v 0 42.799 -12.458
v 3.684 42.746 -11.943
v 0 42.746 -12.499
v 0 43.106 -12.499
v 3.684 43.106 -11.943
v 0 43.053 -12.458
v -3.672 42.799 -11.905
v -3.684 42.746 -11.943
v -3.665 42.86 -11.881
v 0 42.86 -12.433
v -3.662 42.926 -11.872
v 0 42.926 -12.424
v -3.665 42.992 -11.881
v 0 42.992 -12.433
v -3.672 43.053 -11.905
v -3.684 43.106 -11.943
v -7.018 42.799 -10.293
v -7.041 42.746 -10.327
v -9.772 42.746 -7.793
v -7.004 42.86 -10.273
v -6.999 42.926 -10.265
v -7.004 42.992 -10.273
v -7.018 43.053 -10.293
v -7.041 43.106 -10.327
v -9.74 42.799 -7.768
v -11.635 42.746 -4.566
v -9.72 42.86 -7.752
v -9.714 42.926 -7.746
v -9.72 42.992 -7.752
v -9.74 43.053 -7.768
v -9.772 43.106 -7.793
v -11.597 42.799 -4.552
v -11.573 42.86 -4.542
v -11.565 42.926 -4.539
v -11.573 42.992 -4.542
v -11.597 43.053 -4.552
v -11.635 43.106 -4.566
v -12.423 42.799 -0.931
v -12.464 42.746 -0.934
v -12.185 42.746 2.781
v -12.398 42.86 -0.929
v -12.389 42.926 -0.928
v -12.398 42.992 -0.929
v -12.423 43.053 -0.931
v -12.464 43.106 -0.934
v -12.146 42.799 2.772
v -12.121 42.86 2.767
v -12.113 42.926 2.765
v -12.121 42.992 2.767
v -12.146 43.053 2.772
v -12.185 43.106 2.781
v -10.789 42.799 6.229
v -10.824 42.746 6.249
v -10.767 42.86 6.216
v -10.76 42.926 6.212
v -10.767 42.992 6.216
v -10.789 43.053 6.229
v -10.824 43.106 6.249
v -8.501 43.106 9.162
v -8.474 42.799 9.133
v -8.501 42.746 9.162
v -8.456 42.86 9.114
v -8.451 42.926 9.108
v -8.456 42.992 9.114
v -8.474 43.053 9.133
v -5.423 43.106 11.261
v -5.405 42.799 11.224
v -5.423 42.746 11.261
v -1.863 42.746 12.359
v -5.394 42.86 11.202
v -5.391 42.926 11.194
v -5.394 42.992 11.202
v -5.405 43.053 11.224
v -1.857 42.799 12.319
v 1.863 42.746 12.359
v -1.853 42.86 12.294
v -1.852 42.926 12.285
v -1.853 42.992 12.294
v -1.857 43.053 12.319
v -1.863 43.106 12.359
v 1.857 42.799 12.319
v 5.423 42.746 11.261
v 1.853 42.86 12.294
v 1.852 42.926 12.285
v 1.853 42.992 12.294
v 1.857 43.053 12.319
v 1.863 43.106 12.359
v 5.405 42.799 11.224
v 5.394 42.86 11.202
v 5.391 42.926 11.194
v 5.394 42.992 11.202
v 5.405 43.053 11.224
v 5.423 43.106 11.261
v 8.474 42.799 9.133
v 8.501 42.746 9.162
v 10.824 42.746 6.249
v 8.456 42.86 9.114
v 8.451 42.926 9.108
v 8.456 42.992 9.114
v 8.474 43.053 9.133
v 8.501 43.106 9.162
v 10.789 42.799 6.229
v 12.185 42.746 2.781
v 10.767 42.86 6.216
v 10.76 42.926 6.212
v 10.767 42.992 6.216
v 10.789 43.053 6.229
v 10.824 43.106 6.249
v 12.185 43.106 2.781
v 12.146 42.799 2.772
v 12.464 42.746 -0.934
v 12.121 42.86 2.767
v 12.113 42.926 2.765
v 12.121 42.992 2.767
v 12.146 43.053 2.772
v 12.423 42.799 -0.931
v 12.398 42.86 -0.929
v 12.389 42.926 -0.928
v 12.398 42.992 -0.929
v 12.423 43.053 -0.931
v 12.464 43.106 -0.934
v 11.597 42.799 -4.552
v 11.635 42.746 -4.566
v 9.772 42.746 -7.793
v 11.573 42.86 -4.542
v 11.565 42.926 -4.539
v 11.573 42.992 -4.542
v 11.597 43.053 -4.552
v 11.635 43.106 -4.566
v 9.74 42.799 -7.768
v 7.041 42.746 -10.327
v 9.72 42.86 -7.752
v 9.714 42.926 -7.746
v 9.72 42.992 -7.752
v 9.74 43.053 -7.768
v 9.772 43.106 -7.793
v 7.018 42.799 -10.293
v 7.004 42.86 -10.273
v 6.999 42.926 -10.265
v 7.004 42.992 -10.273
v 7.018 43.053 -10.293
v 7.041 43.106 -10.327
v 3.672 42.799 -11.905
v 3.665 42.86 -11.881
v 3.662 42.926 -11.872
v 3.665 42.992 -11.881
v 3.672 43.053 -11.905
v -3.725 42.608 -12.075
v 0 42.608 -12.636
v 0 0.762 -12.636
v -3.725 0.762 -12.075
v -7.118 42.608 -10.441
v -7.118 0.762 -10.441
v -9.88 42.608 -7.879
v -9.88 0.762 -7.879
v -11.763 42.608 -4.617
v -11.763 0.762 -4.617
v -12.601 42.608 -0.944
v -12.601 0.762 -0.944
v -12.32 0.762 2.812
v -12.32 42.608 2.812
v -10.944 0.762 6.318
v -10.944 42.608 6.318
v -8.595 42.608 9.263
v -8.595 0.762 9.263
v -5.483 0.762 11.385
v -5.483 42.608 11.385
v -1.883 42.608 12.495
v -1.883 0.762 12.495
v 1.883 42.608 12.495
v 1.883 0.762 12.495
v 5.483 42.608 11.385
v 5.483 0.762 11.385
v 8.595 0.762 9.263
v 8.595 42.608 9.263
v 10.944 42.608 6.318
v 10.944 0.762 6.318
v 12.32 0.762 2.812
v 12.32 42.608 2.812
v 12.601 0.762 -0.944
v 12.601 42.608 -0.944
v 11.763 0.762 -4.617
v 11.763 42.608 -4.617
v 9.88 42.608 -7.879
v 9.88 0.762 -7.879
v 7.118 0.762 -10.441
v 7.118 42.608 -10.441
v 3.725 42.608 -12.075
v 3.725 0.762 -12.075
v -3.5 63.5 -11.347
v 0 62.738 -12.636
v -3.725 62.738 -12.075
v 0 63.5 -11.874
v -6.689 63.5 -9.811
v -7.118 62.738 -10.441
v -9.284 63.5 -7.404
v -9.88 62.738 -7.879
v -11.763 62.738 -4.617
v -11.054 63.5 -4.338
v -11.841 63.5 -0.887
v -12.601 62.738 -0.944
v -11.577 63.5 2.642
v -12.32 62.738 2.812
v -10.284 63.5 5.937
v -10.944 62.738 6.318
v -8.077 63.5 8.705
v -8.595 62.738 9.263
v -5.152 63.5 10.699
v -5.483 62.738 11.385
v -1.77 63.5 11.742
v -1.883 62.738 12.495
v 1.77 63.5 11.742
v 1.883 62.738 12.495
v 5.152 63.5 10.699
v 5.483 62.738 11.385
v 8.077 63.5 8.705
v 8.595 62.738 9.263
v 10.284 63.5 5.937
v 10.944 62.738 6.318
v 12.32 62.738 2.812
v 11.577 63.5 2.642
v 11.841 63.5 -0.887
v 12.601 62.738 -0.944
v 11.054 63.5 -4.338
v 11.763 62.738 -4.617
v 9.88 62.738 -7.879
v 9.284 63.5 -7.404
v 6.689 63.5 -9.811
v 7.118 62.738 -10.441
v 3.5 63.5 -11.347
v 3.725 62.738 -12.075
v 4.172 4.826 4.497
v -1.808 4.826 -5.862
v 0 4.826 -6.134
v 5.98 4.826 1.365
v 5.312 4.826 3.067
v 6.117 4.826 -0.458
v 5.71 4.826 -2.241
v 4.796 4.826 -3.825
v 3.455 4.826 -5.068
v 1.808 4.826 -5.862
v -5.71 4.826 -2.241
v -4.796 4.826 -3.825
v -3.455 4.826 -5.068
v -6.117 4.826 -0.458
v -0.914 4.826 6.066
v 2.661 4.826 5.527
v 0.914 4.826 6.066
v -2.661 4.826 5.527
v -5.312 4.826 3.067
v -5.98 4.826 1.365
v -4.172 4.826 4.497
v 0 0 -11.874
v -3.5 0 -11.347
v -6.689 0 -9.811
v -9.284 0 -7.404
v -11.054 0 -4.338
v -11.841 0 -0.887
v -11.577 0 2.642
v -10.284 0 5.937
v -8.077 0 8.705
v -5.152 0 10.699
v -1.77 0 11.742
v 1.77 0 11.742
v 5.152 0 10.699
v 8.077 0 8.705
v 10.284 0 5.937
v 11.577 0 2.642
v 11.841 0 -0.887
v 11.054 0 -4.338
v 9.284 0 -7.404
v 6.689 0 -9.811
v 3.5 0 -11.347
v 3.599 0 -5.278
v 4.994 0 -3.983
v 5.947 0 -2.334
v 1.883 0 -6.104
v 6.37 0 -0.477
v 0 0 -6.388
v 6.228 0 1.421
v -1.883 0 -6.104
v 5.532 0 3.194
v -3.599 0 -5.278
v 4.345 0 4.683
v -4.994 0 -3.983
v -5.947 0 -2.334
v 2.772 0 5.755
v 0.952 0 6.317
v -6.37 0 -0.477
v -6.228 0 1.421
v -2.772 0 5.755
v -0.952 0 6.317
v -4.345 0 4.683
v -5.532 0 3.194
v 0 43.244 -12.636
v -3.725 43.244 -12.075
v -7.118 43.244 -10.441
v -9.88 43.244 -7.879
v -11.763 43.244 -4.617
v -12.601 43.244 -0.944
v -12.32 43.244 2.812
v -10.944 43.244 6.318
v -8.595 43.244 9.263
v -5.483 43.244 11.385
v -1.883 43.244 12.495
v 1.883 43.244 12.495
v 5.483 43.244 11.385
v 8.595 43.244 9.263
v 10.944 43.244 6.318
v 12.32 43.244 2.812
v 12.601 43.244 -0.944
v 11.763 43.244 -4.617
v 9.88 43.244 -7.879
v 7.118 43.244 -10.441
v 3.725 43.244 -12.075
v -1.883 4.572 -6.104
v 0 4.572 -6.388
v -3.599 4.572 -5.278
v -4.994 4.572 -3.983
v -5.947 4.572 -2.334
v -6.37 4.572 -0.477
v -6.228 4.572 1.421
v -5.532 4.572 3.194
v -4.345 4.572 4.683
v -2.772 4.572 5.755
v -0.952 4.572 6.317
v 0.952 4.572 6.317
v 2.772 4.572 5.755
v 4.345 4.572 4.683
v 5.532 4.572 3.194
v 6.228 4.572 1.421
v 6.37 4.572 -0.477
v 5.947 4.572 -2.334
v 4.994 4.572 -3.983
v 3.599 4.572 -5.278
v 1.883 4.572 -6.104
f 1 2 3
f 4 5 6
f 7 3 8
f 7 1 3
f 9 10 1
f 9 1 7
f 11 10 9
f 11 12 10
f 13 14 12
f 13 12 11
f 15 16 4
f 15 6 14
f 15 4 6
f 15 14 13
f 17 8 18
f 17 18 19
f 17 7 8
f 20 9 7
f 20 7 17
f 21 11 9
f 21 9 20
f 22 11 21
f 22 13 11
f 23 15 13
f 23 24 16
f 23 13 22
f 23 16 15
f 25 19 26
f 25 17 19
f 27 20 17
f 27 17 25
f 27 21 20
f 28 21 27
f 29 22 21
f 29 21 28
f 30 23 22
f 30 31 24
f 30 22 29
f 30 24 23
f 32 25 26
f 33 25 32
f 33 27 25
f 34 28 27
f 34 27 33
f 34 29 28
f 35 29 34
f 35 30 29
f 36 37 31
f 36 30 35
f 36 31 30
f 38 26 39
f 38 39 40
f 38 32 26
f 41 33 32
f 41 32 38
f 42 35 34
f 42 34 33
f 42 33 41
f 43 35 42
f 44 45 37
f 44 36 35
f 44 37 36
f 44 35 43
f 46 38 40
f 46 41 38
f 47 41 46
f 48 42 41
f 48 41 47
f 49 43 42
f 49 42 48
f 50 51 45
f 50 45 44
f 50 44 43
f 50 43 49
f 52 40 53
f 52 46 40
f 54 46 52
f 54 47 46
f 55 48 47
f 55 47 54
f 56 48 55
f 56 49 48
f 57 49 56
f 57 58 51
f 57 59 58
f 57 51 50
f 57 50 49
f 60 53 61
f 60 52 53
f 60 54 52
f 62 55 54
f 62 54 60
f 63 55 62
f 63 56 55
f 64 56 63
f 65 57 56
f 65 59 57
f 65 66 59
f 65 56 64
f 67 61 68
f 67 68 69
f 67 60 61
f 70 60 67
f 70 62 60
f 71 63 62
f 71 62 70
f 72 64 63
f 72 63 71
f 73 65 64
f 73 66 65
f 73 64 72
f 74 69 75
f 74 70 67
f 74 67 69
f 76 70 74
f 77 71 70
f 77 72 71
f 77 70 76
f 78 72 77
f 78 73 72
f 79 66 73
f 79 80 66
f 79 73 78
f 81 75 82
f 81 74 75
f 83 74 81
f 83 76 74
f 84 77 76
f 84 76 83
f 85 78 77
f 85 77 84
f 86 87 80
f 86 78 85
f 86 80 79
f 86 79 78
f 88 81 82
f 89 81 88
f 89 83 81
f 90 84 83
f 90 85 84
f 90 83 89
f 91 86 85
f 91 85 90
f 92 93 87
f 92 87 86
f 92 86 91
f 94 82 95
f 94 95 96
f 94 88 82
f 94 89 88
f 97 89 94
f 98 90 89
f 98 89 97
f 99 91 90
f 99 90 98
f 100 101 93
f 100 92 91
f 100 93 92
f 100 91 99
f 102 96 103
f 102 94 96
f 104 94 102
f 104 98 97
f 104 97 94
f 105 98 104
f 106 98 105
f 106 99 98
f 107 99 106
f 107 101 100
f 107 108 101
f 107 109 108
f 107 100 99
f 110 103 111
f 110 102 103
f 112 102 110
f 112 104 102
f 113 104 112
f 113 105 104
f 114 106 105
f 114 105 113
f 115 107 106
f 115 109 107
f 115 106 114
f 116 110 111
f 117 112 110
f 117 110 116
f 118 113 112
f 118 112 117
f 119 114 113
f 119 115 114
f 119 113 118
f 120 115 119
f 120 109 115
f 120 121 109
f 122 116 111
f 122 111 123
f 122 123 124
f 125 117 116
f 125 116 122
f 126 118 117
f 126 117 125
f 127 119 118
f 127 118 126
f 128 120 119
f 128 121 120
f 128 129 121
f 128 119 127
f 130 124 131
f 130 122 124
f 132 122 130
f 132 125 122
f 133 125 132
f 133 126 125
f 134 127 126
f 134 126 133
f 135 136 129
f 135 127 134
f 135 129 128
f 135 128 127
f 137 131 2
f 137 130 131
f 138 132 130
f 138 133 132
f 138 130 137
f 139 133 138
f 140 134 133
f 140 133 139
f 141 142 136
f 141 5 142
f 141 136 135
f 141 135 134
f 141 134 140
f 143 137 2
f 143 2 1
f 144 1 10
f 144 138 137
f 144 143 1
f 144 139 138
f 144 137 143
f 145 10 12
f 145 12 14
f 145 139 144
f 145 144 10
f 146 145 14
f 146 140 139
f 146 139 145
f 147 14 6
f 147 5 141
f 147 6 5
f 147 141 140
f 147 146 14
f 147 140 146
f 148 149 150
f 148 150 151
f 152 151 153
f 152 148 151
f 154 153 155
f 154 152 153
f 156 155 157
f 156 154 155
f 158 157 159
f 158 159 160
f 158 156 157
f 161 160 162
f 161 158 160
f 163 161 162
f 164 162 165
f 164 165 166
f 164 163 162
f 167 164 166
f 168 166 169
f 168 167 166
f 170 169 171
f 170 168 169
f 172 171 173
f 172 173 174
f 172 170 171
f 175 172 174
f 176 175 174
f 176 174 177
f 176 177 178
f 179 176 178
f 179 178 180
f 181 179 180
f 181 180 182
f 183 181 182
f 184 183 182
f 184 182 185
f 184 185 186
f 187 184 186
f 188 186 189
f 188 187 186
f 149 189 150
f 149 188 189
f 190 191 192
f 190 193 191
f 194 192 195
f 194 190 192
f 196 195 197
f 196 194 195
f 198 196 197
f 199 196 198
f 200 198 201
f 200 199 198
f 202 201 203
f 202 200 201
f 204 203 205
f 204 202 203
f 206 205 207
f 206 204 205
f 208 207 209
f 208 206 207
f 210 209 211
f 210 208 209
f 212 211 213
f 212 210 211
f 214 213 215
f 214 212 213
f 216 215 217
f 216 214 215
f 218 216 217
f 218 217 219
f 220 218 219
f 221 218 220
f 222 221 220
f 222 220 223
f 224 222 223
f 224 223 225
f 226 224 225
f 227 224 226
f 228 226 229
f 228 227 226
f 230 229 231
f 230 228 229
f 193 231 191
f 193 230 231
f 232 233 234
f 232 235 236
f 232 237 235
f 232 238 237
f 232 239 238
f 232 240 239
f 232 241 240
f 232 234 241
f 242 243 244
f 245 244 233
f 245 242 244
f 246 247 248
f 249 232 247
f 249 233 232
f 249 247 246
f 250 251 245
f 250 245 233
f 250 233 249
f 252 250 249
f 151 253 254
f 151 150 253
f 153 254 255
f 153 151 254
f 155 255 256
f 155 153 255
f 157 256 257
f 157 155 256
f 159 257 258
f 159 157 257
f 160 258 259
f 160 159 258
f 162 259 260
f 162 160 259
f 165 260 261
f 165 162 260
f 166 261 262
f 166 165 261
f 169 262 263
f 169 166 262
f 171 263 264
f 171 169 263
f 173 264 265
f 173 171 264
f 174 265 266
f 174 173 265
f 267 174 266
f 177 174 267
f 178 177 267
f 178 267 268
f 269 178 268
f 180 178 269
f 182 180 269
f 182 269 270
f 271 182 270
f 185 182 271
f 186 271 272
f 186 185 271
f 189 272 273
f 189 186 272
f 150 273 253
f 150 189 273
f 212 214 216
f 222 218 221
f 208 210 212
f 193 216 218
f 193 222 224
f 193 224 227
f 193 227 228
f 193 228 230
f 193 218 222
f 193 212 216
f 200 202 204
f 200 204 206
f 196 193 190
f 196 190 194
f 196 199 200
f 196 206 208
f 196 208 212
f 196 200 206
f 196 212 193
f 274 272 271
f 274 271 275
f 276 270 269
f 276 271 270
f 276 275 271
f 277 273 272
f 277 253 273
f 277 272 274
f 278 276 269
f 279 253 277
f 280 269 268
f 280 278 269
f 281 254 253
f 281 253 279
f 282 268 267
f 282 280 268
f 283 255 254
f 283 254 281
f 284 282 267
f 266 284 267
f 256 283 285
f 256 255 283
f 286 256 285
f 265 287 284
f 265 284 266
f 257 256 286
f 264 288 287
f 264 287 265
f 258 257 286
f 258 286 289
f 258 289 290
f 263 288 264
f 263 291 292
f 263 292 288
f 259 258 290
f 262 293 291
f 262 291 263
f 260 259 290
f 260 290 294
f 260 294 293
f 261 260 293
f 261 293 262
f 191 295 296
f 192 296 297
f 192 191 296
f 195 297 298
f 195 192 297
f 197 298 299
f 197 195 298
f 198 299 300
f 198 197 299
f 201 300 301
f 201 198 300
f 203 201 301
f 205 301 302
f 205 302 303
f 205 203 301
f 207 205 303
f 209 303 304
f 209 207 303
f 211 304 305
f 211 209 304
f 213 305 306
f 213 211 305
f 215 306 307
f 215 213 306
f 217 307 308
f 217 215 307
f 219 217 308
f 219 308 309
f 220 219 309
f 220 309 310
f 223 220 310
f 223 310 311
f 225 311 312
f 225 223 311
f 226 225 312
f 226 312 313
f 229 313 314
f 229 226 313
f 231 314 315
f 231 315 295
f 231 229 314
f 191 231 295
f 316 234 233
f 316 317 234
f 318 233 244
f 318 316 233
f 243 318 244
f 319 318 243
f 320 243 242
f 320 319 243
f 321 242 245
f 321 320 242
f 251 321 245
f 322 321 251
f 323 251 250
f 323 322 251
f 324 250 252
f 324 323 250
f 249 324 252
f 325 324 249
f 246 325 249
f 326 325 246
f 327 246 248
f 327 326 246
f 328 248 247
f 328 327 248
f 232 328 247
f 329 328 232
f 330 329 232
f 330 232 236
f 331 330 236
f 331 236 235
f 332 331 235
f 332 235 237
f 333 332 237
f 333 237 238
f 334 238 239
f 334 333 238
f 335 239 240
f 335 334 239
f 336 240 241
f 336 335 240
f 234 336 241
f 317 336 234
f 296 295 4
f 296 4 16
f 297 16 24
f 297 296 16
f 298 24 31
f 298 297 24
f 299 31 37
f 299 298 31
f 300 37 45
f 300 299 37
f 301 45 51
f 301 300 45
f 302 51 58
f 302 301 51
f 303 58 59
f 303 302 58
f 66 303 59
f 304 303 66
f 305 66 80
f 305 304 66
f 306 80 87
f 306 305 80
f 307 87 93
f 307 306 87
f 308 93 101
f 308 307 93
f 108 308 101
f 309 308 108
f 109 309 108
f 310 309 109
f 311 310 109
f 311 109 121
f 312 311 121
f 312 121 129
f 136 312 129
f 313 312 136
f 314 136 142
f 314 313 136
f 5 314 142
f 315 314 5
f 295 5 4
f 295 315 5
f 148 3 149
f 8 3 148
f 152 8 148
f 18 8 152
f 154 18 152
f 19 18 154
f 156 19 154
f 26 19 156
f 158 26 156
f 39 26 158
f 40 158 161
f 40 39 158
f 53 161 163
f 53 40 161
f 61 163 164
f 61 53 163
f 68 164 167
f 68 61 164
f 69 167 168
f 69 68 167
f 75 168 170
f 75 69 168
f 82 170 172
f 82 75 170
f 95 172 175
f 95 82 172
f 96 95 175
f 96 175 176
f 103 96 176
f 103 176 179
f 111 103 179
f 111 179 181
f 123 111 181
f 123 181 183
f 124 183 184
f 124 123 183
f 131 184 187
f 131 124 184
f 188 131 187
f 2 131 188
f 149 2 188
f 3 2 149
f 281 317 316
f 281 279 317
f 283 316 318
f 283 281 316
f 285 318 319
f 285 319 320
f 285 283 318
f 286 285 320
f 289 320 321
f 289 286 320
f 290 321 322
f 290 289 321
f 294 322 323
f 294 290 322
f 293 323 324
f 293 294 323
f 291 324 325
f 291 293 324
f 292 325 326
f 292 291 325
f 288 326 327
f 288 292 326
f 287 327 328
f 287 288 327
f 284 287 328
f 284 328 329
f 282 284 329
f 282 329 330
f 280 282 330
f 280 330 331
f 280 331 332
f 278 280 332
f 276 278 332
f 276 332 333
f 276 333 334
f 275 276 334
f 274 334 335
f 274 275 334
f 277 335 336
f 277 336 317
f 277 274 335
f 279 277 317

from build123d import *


with BuildPart() as part:
    # Sketch1 → Revolve1 (revolve)
    with BuildSketch(Plane.XY, mode=Mode.PRIVATE) as revolve1_sk:
        Polygon((12.6365, 0.762), (12.6365, 62.738), (11.8745, 63.5), (0, 63.5), (0, 4.826), (6.1341, 4.826), (6.3881, 4.572), (6.3881, 0), (11.8745, 0), align=None)
    revolve(revolve1_sk.sketch.rotate(Axis((0, 0, 0), (0, 1, 0)), 90), axis=Axis((0, 0, 0), (0, 1, 0)))  # turned: the seam where the file's is

    # Sketch2 → Cut-Revolve1 (revolve, cut)
    with BuildSketch(Plane.XY, mode=Mode.PRIVATE) as cut_revolve1_sk:
        with BuildLine():
            Line((12.7, 43.307), (12.7, 42.545))
            Line((12.7, 42.545), (12.498605122, 42.746394878))
            ThreePointArc((12.498605122, 42.746394878), (12.424210245, 42.926), (12.498605122, 43.105605122))
            Line((12.498605122, 43.105605122), (12.7, 43.307))
        make_face()
    revolve(cut_revolve1_sk.sketch.rotate(Axis((0, 0, 0), (0, 1, 0)), 90), axis=Axis((0, 0, 0), (0, 1, 0)), mode=Mode.SUBTRACT)  # turned: the seam where the file's is


solid = part.part
